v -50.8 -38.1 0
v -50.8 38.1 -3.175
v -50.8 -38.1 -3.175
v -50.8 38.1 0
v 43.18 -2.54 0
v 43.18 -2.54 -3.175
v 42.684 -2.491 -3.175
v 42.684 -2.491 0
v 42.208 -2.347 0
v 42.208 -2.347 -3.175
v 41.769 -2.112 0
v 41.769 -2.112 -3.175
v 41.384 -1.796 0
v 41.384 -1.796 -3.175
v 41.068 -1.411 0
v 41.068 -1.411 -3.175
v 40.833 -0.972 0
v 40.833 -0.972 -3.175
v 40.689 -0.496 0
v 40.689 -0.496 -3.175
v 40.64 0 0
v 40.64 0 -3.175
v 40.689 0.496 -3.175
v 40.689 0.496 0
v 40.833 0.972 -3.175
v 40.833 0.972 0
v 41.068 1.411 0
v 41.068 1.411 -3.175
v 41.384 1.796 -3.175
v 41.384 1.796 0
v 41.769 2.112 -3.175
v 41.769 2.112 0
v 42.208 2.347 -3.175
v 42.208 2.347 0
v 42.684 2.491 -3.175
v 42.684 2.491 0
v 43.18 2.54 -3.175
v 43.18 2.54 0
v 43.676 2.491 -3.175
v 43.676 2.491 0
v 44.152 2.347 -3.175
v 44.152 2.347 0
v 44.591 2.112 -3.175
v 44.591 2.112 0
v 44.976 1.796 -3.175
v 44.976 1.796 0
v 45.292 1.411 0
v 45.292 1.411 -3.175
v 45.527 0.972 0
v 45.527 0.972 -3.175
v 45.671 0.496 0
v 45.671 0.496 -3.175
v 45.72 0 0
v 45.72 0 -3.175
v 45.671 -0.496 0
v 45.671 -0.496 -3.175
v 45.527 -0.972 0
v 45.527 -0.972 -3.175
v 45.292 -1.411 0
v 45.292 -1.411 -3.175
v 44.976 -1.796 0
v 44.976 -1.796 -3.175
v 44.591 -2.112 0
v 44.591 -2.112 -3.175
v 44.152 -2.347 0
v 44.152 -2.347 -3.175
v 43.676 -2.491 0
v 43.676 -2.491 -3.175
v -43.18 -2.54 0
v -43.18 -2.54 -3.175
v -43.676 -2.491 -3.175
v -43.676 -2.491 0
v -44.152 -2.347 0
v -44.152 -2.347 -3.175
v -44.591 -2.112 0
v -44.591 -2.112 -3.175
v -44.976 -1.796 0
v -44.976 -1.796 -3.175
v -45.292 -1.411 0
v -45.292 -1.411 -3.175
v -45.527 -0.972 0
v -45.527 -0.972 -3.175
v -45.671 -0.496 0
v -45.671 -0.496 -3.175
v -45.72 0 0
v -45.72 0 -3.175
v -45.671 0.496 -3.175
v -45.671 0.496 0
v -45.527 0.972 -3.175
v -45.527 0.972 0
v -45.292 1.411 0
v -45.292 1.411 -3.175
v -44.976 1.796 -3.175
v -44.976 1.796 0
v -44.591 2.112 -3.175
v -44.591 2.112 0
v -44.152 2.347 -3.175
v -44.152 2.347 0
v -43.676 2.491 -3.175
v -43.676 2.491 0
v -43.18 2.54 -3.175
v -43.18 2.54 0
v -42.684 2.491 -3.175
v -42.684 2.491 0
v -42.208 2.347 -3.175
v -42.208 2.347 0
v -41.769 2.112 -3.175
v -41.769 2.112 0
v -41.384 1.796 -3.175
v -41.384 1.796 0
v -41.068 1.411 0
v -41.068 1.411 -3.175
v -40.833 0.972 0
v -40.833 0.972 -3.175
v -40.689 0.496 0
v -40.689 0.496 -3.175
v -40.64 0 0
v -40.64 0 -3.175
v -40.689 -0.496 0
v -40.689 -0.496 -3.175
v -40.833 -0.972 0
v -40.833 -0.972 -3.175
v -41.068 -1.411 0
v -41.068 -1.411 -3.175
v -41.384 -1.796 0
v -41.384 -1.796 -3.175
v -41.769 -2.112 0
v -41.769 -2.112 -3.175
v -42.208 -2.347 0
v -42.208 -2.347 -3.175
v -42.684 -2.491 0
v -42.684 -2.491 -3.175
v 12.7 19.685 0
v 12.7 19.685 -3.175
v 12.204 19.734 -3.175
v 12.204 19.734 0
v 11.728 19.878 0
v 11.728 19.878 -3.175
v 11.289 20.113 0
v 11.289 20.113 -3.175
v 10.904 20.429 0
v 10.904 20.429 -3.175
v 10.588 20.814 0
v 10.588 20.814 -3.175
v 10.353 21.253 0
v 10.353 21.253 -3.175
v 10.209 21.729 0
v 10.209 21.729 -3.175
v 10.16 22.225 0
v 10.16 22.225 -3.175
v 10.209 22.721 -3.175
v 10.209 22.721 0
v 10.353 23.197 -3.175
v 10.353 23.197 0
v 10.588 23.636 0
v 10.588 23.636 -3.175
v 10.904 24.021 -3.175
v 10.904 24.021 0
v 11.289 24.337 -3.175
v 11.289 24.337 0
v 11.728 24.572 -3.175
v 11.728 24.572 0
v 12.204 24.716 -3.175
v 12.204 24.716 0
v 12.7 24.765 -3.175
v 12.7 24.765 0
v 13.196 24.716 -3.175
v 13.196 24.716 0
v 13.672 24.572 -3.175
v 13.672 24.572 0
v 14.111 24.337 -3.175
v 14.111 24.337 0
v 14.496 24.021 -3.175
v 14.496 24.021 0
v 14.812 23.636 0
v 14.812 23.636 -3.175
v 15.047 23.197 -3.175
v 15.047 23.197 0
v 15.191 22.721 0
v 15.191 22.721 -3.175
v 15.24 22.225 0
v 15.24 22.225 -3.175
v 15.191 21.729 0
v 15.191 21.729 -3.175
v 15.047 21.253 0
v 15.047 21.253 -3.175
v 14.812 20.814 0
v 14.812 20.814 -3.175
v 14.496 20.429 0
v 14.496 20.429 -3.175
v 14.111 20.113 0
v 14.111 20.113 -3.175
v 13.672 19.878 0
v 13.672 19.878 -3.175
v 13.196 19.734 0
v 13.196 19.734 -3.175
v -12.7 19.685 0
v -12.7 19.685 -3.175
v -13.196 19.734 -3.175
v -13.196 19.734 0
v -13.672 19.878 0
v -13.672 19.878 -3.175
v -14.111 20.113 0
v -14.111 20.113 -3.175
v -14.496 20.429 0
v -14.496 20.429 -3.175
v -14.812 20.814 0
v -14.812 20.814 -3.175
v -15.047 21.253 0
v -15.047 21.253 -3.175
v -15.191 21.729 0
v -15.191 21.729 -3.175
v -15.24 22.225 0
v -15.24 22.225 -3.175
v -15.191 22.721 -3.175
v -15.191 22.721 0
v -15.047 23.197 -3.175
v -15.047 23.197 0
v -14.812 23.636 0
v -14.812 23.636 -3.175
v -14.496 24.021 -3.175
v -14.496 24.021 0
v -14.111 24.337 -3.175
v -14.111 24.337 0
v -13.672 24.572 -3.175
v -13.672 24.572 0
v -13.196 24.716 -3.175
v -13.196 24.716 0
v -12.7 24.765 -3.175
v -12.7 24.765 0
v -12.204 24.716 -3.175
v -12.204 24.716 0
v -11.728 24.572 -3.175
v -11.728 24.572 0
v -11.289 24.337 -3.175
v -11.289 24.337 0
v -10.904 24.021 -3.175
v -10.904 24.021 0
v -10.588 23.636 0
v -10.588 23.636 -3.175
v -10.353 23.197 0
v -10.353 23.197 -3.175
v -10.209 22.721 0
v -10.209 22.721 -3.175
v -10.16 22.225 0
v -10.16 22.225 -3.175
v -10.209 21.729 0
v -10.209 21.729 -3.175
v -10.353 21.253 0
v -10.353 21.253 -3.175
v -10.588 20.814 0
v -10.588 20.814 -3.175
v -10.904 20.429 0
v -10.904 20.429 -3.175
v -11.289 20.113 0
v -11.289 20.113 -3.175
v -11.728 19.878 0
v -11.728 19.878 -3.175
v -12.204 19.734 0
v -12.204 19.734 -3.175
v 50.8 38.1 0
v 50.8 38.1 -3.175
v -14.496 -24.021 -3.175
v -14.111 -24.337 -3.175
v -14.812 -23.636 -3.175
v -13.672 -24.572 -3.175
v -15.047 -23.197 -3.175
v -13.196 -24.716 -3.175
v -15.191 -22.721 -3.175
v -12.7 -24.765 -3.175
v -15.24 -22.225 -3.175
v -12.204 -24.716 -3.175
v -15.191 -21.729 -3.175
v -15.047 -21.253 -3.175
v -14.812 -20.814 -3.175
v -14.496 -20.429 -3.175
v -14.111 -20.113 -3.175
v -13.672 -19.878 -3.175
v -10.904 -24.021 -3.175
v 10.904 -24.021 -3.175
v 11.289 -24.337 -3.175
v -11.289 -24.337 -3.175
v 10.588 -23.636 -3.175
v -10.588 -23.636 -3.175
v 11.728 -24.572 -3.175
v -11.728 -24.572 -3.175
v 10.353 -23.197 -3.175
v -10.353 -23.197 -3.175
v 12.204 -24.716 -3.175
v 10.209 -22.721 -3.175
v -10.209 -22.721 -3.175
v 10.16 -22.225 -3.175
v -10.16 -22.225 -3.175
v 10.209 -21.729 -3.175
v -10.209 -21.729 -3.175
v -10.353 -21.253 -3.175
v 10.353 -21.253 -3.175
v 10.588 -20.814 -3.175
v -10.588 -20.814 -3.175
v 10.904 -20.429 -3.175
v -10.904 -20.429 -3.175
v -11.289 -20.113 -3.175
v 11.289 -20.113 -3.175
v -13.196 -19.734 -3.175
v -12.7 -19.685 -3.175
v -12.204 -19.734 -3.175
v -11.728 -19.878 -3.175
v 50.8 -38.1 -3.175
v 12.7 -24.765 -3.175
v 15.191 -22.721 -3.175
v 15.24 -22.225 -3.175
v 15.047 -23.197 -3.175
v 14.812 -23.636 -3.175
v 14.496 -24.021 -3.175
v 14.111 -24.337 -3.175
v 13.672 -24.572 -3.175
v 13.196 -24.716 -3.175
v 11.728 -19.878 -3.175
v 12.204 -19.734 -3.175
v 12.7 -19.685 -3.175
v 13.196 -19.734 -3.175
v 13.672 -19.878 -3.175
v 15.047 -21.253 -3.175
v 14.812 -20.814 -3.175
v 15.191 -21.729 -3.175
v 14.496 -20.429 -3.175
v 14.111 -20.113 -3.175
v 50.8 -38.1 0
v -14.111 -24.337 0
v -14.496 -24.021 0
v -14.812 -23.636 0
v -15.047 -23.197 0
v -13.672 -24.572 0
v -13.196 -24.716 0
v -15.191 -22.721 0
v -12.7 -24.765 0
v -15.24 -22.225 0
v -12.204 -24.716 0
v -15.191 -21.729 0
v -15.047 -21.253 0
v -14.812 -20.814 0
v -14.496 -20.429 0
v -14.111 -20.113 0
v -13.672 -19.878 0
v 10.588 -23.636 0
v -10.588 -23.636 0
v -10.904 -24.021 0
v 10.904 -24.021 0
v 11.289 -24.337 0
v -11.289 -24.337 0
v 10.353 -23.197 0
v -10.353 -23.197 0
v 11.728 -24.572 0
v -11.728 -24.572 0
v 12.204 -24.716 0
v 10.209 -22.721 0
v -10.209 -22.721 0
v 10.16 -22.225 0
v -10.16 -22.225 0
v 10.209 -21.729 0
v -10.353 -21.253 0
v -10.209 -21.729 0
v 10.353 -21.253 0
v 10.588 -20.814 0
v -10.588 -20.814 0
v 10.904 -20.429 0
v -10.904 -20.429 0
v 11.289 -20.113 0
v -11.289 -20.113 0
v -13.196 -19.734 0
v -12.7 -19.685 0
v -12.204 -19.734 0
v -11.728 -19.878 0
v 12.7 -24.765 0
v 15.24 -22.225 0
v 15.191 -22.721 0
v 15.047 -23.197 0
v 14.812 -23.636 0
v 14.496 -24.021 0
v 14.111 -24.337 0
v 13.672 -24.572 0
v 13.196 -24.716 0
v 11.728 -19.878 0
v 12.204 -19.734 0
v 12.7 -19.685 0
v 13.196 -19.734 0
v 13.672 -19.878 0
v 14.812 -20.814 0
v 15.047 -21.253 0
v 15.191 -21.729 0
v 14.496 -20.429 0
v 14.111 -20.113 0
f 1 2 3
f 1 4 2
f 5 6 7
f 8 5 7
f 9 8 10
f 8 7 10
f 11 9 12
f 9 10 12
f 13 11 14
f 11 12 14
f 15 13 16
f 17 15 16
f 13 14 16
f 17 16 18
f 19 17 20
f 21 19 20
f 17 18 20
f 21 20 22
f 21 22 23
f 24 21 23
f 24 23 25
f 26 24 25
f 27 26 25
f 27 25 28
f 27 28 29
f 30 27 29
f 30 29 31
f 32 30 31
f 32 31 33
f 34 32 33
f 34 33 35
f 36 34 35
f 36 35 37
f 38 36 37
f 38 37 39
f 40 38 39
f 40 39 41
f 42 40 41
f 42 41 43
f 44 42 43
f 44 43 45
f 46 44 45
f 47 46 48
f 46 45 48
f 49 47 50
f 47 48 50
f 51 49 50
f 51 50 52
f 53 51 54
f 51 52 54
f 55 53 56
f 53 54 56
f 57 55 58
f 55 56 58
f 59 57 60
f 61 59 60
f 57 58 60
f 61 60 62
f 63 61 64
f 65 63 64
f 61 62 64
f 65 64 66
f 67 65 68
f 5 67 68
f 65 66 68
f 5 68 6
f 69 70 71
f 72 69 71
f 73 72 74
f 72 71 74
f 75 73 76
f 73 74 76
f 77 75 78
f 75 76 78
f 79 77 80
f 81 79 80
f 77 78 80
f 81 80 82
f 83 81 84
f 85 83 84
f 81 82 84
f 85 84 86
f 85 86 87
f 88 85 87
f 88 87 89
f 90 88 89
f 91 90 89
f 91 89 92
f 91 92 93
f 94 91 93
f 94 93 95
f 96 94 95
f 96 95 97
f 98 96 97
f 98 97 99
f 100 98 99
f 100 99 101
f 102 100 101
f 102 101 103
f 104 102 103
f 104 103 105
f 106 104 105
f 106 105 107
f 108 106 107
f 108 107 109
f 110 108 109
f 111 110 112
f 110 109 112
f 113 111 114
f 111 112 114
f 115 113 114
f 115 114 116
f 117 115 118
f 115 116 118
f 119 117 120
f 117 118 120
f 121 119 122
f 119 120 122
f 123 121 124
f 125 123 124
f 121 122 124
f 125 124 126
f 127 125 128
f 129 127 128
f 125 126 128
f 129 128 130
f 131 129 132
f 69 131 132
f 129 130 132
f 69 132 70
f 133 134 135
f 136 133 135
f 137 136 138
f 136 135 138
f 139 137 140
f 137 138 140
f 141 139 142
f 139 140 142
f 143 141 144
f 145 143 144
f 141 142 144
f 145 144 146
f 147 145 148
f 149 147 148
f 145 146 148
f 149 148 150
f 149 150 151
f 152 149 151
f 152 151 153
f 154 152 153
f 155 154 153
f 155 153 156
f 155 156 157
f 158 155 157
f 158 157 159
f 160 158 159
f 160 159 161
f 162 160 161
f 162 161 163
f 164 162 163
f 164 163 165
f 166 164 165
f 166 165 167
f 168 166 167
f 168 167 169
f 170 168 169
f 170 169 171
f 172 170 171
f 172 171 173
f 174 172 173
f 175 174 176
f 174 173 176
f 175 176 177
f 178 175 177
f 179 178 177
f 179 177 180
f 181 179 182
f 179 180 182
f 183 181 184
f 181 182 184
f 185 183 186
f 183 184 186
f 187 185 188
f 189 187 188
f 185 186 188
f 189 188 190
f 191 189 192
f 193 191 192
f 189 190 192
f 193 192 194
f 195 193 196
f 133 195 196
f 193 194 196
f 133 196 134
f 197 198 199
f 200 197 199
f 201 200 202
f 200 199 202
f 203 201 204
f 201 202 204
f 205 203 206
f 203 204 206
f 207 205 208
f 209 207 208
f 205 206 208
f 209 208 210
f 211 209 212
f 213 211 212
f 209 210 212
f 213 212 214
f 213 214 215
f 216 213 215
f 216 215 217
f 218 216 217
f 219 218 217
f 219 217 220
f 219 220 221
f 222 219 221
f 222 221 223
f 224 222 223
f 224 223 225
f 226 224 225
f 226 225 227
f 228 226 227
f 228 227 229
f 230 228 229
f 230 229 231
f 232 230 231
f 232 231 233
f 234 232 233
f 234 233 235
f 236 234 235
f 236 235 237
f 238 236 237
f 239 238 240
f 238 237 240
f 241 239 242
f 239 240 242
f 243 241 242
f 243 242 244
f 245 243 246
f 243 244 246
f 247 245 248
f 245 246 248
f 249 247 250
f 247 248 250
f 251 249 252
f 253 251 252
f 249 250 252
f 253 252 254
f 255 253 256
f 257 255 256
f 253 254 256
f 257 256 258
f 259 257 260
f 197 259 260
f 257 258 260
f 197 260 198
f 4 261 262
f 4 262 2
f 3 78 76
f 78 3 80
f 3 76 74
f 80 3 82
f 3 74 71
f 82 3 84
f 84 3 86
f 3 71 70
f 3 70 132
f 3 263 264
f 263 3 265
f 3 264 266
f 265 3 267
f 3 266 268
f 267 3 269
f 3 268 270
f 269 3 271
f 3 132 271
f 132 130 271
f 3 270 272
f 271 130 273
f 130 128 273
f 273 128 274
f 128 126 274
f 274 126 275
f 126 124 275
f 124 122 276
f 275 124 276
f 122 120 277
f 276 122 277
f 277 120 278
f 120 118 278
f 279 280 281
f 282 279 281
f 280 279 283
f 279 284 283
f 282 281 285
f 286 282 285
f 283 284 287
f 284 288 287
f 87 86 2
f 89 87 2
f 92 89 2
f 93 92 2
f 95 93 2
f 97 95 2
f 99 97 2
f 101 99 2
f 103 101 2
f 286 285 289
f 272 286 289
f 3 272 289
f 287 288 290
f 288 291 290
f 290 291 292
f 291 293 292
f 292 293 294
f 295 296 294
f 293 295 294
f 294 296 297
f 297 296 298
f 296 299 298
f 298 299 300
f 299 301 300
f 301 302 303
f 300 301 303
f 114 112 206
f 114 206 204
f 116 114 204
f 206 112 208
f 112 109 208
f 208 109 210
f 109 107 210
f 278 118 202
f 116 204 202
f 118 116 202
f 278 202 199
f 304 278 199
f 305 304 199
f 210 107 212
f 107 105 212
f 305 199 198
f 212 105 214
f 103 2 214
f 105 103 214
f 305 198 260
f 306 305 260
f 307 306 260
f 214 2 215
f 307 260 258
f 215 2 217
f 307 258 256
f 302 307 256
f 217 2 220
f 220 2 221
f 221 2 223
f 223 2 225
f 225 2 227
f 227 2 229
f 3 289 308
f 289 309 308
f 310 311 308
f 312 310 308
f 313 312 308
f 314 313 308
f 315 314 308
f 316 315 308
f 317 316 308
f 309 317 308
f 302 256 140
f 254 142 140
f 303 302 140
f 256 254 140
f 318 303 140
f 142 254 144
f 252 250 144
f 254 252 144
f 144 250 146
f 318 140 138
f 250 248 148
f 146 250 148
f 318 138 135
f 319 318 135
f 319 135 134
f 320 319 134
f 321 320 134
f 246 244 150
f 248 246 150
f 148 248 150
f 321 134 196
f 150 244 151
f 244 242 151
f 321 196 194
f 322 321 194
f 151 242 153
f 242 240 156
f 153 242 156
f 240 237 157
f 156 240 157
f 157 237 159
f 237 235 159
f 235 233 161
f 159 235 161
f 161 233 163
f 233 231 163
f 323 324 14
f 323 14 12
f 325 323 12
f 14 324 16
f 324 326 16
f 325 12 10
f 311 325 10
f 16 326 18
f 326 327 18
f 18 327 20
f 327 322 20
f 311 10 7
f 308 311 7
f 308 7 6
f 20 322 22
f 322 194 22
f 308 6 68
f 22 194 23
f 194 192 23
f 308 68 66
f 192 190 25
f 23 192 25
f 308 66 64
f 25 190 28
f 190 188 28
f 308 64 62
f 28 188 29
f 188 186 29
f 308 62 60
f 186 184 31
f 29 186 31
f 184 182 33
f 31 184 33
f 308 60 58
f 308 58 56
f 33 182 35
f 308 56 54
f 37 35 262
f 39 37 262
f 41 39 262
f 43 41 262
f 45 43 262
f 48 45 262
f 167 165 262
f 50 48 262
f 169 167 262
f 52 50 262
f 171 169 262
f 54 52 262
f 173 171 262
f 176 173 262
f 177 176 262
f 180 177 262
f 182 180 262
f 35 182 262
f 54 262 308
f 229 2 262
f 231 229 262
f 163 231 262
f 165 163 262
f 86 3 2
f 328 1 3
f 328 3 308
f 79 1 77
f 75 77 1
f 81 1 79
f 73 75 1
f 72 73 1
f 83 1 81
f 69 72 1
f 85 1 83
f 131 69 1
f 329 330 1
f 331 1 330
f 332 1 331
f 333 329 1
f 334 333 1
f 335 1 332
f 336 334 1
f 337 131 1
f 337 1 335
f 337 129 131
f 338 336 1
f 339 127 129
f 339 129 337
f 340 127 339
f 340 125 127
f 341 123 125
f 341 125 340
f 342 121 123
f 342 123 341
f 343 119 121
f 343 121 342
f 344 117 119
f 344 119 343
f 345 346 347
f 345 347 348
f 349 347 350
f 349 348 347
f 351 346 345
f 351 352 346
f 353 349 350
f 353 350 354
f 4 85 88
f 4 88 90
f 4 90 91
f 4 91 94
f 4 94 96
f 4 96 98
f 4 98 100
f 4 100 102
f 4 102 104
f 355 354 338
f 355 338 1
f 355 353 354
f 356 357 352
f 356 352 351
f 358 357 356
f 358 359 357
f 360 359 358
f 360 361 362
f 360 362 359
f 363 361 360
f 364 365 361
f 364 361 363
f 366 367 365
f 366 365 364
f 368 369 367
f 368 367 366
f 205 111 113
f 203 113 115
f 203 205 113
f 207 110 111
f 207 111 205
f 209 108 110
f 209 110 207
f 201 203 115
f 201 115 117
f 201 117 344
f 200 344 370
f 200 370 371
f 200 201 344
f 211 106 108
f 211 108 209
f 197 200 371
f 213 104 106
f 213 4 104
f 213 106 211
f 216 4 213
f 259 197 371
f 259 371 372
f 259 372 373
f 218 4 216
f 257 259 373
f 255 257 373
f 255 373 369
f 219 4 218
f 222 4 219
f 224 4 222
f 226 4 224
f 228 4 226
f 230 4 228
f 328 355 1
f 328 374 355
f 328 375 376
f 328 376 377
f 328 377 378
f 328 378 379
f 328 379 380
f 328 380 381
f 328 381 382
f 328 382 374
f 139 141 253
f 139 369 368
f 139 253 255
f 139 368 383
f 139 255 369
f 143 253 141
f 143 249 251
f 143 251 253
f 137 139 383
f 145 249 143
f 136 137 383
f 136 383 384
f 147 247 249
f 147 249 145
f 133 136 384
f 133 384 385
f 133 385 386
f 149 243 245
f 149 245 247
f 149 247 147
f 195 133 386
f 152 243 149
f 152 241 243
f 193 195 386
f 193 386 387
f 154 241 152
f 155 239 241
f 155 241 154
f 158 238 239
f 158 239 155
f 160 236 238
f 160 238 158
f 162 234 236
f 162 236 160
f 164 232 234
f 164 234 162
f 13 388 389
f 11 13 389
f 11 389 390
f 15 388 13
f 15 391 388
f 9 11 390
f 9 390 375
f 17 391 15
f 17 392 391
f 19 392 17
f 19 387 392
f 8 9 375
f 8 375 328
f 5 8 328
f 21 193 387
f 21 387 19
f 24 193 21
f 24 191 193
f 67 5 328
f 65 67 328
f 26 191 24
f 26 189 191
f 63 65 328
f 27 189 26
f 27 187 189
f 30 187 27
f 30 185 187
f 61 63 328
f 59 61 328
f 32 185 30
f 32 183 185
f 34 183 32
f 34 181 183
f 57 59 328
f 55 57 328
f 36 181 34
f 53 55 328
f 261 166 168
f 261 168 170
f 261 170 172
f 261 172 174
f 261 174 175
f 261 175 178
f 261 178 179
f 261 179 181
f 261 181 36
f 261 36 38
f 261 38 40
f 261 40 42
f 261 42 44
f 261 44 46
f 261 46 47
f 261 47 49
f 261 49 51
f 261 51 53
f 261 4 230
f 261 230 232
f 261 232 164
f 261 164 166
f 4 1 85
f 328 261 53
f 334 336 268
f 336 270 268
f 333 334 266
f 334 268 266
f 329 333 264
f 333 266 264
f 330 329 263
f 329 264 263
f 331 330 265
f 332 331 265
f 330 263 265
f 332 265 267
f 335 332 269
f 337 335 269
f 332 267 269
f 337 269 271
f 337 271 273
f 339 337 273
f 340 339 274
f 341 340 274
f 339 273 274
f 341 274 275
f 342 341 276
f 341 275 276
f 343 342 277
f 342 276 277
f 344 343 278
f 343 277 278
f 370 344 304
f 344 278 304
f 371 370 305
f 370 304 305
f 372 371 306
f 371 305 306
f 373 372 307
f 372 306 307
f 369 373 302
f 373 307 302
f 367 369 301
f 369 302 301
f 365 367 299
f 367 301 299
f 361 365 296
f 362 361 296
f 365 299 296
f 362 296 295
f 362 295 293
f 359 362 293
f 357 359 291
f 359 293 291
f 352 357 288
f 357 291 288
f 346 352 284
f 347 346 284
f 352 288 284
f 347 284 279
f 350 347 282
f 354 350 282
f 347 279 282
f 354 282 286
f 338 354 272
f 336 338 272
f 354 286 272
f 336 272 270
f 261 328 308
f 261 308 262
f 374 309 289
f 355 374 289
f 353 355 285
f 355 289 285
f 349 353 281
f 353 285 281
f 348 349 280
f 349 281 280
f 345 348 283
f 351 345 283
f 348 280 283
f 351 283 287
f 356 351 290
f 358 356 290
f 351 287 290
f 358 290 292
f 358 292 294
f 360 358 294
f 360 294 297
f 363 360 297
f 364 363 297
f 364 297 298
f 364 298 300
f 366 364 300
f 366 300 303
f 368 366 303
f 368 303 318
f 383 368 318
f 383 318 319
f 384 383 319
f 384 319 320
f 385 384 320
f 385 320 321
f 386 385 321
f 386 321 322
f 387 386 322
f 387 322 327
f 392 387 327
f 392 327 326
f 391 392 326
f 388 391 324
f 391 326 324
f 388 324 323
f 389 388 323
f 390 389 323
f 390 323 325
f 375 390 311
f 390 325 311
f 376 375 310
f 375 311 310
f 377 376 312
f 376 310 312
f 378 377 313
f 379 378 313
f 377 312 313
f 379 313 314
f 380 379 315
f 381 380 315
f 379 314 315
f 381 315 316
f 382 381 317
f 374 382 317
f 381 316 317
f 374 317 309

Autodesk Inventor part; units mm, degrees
ref_plane "YZ Plane" through (0, 0, 0) normal (1, 0, 0) x (0, 1, 0)
ref_plane "XZ Plane" through (0, 0, 0) normal (0, 1, 0) x (-1, 0, 0)
ref_plane "XY Plane" through (0, 0, 0) normal (0, 0, 1) x (1, 0, 0)
sketch "Sketch1" plane through (0, 0, 0) normal (0, 0, 1) x (1, 0, 0)
  line L0 (-50.8, -38.1) -> (50.8, -38.1)
  line L1 (50.8, -38.1) -> (50.8, 38.1)
  line L2 (50.8, 38.1) -> (-50.8, 38.1)
  line L3 (-50.8, 38.1) -> (-50.8, -38.1)
  line L4 (-50.8, -38.1) -> (50.8, 38.1) construction
  line L5 (50.8, -38.1) -> (-50.8, 38.1) construction
  point P0 (0, 0)
  dimension "d0" = 101.6
  dimension "d1" = 76.2
extrude "Extrusion1" add sketch "Sketch1" against normal blind 3.175
sketch "Sketch2" plane through (0, 0, 0) normal (0, 0, 1) x (1, 0, 0)
  circle A0 centre (43.18, 0) radius 2.54
  line L0 (50.8, -38.1) -> (50.8, 38.1) projected
  line L1 (0, 38.1) -> (0, -38.1) construction
  circle A1 centre (-43.18, 0) radius 2.54
  point P0 (0, 0)
  dimension "d4" = 5.08
  dimension "d5" = 7.62
hole "Hole1" at (-43.18, 0, 0) at (43.18, 0, 0) direction (0, 0, -1) diameter 5.08 end through all
sketch "Sketch3" plane through (0, 0, 0) normal (0, 0, 1) x (1, 0, 0)
  line L0 (0, 29.2764) -> (0, -24.7835) construction
  line L1 (50.8, 38.1) -> (-50.8, 38.1) construction
  line L2 (-18.9862, 0) -> (21.3051, 0) construction
  point P0 (0, 0)
  point P1 (-12.7, 22.225)
  point P2 (0, 38.1)
  point P3 (12.7, 22.225)
  point P4 (-12.7, -22.225)
  point P5 (12.7, -22.225)
  dimension "d13" = 22.225
  dimension "d14" = 12.7
hole "Hole2" at (-12.7, 22.225, 0) at (12.7, 22.225, 0) at (-12.7, -22.225, 0) at (12.7, -22.225, 0) direction (0, 0, -1) diameter 5.08 end through all
properties part number "VEX Motor Mount" material "Aluminum 6061"
